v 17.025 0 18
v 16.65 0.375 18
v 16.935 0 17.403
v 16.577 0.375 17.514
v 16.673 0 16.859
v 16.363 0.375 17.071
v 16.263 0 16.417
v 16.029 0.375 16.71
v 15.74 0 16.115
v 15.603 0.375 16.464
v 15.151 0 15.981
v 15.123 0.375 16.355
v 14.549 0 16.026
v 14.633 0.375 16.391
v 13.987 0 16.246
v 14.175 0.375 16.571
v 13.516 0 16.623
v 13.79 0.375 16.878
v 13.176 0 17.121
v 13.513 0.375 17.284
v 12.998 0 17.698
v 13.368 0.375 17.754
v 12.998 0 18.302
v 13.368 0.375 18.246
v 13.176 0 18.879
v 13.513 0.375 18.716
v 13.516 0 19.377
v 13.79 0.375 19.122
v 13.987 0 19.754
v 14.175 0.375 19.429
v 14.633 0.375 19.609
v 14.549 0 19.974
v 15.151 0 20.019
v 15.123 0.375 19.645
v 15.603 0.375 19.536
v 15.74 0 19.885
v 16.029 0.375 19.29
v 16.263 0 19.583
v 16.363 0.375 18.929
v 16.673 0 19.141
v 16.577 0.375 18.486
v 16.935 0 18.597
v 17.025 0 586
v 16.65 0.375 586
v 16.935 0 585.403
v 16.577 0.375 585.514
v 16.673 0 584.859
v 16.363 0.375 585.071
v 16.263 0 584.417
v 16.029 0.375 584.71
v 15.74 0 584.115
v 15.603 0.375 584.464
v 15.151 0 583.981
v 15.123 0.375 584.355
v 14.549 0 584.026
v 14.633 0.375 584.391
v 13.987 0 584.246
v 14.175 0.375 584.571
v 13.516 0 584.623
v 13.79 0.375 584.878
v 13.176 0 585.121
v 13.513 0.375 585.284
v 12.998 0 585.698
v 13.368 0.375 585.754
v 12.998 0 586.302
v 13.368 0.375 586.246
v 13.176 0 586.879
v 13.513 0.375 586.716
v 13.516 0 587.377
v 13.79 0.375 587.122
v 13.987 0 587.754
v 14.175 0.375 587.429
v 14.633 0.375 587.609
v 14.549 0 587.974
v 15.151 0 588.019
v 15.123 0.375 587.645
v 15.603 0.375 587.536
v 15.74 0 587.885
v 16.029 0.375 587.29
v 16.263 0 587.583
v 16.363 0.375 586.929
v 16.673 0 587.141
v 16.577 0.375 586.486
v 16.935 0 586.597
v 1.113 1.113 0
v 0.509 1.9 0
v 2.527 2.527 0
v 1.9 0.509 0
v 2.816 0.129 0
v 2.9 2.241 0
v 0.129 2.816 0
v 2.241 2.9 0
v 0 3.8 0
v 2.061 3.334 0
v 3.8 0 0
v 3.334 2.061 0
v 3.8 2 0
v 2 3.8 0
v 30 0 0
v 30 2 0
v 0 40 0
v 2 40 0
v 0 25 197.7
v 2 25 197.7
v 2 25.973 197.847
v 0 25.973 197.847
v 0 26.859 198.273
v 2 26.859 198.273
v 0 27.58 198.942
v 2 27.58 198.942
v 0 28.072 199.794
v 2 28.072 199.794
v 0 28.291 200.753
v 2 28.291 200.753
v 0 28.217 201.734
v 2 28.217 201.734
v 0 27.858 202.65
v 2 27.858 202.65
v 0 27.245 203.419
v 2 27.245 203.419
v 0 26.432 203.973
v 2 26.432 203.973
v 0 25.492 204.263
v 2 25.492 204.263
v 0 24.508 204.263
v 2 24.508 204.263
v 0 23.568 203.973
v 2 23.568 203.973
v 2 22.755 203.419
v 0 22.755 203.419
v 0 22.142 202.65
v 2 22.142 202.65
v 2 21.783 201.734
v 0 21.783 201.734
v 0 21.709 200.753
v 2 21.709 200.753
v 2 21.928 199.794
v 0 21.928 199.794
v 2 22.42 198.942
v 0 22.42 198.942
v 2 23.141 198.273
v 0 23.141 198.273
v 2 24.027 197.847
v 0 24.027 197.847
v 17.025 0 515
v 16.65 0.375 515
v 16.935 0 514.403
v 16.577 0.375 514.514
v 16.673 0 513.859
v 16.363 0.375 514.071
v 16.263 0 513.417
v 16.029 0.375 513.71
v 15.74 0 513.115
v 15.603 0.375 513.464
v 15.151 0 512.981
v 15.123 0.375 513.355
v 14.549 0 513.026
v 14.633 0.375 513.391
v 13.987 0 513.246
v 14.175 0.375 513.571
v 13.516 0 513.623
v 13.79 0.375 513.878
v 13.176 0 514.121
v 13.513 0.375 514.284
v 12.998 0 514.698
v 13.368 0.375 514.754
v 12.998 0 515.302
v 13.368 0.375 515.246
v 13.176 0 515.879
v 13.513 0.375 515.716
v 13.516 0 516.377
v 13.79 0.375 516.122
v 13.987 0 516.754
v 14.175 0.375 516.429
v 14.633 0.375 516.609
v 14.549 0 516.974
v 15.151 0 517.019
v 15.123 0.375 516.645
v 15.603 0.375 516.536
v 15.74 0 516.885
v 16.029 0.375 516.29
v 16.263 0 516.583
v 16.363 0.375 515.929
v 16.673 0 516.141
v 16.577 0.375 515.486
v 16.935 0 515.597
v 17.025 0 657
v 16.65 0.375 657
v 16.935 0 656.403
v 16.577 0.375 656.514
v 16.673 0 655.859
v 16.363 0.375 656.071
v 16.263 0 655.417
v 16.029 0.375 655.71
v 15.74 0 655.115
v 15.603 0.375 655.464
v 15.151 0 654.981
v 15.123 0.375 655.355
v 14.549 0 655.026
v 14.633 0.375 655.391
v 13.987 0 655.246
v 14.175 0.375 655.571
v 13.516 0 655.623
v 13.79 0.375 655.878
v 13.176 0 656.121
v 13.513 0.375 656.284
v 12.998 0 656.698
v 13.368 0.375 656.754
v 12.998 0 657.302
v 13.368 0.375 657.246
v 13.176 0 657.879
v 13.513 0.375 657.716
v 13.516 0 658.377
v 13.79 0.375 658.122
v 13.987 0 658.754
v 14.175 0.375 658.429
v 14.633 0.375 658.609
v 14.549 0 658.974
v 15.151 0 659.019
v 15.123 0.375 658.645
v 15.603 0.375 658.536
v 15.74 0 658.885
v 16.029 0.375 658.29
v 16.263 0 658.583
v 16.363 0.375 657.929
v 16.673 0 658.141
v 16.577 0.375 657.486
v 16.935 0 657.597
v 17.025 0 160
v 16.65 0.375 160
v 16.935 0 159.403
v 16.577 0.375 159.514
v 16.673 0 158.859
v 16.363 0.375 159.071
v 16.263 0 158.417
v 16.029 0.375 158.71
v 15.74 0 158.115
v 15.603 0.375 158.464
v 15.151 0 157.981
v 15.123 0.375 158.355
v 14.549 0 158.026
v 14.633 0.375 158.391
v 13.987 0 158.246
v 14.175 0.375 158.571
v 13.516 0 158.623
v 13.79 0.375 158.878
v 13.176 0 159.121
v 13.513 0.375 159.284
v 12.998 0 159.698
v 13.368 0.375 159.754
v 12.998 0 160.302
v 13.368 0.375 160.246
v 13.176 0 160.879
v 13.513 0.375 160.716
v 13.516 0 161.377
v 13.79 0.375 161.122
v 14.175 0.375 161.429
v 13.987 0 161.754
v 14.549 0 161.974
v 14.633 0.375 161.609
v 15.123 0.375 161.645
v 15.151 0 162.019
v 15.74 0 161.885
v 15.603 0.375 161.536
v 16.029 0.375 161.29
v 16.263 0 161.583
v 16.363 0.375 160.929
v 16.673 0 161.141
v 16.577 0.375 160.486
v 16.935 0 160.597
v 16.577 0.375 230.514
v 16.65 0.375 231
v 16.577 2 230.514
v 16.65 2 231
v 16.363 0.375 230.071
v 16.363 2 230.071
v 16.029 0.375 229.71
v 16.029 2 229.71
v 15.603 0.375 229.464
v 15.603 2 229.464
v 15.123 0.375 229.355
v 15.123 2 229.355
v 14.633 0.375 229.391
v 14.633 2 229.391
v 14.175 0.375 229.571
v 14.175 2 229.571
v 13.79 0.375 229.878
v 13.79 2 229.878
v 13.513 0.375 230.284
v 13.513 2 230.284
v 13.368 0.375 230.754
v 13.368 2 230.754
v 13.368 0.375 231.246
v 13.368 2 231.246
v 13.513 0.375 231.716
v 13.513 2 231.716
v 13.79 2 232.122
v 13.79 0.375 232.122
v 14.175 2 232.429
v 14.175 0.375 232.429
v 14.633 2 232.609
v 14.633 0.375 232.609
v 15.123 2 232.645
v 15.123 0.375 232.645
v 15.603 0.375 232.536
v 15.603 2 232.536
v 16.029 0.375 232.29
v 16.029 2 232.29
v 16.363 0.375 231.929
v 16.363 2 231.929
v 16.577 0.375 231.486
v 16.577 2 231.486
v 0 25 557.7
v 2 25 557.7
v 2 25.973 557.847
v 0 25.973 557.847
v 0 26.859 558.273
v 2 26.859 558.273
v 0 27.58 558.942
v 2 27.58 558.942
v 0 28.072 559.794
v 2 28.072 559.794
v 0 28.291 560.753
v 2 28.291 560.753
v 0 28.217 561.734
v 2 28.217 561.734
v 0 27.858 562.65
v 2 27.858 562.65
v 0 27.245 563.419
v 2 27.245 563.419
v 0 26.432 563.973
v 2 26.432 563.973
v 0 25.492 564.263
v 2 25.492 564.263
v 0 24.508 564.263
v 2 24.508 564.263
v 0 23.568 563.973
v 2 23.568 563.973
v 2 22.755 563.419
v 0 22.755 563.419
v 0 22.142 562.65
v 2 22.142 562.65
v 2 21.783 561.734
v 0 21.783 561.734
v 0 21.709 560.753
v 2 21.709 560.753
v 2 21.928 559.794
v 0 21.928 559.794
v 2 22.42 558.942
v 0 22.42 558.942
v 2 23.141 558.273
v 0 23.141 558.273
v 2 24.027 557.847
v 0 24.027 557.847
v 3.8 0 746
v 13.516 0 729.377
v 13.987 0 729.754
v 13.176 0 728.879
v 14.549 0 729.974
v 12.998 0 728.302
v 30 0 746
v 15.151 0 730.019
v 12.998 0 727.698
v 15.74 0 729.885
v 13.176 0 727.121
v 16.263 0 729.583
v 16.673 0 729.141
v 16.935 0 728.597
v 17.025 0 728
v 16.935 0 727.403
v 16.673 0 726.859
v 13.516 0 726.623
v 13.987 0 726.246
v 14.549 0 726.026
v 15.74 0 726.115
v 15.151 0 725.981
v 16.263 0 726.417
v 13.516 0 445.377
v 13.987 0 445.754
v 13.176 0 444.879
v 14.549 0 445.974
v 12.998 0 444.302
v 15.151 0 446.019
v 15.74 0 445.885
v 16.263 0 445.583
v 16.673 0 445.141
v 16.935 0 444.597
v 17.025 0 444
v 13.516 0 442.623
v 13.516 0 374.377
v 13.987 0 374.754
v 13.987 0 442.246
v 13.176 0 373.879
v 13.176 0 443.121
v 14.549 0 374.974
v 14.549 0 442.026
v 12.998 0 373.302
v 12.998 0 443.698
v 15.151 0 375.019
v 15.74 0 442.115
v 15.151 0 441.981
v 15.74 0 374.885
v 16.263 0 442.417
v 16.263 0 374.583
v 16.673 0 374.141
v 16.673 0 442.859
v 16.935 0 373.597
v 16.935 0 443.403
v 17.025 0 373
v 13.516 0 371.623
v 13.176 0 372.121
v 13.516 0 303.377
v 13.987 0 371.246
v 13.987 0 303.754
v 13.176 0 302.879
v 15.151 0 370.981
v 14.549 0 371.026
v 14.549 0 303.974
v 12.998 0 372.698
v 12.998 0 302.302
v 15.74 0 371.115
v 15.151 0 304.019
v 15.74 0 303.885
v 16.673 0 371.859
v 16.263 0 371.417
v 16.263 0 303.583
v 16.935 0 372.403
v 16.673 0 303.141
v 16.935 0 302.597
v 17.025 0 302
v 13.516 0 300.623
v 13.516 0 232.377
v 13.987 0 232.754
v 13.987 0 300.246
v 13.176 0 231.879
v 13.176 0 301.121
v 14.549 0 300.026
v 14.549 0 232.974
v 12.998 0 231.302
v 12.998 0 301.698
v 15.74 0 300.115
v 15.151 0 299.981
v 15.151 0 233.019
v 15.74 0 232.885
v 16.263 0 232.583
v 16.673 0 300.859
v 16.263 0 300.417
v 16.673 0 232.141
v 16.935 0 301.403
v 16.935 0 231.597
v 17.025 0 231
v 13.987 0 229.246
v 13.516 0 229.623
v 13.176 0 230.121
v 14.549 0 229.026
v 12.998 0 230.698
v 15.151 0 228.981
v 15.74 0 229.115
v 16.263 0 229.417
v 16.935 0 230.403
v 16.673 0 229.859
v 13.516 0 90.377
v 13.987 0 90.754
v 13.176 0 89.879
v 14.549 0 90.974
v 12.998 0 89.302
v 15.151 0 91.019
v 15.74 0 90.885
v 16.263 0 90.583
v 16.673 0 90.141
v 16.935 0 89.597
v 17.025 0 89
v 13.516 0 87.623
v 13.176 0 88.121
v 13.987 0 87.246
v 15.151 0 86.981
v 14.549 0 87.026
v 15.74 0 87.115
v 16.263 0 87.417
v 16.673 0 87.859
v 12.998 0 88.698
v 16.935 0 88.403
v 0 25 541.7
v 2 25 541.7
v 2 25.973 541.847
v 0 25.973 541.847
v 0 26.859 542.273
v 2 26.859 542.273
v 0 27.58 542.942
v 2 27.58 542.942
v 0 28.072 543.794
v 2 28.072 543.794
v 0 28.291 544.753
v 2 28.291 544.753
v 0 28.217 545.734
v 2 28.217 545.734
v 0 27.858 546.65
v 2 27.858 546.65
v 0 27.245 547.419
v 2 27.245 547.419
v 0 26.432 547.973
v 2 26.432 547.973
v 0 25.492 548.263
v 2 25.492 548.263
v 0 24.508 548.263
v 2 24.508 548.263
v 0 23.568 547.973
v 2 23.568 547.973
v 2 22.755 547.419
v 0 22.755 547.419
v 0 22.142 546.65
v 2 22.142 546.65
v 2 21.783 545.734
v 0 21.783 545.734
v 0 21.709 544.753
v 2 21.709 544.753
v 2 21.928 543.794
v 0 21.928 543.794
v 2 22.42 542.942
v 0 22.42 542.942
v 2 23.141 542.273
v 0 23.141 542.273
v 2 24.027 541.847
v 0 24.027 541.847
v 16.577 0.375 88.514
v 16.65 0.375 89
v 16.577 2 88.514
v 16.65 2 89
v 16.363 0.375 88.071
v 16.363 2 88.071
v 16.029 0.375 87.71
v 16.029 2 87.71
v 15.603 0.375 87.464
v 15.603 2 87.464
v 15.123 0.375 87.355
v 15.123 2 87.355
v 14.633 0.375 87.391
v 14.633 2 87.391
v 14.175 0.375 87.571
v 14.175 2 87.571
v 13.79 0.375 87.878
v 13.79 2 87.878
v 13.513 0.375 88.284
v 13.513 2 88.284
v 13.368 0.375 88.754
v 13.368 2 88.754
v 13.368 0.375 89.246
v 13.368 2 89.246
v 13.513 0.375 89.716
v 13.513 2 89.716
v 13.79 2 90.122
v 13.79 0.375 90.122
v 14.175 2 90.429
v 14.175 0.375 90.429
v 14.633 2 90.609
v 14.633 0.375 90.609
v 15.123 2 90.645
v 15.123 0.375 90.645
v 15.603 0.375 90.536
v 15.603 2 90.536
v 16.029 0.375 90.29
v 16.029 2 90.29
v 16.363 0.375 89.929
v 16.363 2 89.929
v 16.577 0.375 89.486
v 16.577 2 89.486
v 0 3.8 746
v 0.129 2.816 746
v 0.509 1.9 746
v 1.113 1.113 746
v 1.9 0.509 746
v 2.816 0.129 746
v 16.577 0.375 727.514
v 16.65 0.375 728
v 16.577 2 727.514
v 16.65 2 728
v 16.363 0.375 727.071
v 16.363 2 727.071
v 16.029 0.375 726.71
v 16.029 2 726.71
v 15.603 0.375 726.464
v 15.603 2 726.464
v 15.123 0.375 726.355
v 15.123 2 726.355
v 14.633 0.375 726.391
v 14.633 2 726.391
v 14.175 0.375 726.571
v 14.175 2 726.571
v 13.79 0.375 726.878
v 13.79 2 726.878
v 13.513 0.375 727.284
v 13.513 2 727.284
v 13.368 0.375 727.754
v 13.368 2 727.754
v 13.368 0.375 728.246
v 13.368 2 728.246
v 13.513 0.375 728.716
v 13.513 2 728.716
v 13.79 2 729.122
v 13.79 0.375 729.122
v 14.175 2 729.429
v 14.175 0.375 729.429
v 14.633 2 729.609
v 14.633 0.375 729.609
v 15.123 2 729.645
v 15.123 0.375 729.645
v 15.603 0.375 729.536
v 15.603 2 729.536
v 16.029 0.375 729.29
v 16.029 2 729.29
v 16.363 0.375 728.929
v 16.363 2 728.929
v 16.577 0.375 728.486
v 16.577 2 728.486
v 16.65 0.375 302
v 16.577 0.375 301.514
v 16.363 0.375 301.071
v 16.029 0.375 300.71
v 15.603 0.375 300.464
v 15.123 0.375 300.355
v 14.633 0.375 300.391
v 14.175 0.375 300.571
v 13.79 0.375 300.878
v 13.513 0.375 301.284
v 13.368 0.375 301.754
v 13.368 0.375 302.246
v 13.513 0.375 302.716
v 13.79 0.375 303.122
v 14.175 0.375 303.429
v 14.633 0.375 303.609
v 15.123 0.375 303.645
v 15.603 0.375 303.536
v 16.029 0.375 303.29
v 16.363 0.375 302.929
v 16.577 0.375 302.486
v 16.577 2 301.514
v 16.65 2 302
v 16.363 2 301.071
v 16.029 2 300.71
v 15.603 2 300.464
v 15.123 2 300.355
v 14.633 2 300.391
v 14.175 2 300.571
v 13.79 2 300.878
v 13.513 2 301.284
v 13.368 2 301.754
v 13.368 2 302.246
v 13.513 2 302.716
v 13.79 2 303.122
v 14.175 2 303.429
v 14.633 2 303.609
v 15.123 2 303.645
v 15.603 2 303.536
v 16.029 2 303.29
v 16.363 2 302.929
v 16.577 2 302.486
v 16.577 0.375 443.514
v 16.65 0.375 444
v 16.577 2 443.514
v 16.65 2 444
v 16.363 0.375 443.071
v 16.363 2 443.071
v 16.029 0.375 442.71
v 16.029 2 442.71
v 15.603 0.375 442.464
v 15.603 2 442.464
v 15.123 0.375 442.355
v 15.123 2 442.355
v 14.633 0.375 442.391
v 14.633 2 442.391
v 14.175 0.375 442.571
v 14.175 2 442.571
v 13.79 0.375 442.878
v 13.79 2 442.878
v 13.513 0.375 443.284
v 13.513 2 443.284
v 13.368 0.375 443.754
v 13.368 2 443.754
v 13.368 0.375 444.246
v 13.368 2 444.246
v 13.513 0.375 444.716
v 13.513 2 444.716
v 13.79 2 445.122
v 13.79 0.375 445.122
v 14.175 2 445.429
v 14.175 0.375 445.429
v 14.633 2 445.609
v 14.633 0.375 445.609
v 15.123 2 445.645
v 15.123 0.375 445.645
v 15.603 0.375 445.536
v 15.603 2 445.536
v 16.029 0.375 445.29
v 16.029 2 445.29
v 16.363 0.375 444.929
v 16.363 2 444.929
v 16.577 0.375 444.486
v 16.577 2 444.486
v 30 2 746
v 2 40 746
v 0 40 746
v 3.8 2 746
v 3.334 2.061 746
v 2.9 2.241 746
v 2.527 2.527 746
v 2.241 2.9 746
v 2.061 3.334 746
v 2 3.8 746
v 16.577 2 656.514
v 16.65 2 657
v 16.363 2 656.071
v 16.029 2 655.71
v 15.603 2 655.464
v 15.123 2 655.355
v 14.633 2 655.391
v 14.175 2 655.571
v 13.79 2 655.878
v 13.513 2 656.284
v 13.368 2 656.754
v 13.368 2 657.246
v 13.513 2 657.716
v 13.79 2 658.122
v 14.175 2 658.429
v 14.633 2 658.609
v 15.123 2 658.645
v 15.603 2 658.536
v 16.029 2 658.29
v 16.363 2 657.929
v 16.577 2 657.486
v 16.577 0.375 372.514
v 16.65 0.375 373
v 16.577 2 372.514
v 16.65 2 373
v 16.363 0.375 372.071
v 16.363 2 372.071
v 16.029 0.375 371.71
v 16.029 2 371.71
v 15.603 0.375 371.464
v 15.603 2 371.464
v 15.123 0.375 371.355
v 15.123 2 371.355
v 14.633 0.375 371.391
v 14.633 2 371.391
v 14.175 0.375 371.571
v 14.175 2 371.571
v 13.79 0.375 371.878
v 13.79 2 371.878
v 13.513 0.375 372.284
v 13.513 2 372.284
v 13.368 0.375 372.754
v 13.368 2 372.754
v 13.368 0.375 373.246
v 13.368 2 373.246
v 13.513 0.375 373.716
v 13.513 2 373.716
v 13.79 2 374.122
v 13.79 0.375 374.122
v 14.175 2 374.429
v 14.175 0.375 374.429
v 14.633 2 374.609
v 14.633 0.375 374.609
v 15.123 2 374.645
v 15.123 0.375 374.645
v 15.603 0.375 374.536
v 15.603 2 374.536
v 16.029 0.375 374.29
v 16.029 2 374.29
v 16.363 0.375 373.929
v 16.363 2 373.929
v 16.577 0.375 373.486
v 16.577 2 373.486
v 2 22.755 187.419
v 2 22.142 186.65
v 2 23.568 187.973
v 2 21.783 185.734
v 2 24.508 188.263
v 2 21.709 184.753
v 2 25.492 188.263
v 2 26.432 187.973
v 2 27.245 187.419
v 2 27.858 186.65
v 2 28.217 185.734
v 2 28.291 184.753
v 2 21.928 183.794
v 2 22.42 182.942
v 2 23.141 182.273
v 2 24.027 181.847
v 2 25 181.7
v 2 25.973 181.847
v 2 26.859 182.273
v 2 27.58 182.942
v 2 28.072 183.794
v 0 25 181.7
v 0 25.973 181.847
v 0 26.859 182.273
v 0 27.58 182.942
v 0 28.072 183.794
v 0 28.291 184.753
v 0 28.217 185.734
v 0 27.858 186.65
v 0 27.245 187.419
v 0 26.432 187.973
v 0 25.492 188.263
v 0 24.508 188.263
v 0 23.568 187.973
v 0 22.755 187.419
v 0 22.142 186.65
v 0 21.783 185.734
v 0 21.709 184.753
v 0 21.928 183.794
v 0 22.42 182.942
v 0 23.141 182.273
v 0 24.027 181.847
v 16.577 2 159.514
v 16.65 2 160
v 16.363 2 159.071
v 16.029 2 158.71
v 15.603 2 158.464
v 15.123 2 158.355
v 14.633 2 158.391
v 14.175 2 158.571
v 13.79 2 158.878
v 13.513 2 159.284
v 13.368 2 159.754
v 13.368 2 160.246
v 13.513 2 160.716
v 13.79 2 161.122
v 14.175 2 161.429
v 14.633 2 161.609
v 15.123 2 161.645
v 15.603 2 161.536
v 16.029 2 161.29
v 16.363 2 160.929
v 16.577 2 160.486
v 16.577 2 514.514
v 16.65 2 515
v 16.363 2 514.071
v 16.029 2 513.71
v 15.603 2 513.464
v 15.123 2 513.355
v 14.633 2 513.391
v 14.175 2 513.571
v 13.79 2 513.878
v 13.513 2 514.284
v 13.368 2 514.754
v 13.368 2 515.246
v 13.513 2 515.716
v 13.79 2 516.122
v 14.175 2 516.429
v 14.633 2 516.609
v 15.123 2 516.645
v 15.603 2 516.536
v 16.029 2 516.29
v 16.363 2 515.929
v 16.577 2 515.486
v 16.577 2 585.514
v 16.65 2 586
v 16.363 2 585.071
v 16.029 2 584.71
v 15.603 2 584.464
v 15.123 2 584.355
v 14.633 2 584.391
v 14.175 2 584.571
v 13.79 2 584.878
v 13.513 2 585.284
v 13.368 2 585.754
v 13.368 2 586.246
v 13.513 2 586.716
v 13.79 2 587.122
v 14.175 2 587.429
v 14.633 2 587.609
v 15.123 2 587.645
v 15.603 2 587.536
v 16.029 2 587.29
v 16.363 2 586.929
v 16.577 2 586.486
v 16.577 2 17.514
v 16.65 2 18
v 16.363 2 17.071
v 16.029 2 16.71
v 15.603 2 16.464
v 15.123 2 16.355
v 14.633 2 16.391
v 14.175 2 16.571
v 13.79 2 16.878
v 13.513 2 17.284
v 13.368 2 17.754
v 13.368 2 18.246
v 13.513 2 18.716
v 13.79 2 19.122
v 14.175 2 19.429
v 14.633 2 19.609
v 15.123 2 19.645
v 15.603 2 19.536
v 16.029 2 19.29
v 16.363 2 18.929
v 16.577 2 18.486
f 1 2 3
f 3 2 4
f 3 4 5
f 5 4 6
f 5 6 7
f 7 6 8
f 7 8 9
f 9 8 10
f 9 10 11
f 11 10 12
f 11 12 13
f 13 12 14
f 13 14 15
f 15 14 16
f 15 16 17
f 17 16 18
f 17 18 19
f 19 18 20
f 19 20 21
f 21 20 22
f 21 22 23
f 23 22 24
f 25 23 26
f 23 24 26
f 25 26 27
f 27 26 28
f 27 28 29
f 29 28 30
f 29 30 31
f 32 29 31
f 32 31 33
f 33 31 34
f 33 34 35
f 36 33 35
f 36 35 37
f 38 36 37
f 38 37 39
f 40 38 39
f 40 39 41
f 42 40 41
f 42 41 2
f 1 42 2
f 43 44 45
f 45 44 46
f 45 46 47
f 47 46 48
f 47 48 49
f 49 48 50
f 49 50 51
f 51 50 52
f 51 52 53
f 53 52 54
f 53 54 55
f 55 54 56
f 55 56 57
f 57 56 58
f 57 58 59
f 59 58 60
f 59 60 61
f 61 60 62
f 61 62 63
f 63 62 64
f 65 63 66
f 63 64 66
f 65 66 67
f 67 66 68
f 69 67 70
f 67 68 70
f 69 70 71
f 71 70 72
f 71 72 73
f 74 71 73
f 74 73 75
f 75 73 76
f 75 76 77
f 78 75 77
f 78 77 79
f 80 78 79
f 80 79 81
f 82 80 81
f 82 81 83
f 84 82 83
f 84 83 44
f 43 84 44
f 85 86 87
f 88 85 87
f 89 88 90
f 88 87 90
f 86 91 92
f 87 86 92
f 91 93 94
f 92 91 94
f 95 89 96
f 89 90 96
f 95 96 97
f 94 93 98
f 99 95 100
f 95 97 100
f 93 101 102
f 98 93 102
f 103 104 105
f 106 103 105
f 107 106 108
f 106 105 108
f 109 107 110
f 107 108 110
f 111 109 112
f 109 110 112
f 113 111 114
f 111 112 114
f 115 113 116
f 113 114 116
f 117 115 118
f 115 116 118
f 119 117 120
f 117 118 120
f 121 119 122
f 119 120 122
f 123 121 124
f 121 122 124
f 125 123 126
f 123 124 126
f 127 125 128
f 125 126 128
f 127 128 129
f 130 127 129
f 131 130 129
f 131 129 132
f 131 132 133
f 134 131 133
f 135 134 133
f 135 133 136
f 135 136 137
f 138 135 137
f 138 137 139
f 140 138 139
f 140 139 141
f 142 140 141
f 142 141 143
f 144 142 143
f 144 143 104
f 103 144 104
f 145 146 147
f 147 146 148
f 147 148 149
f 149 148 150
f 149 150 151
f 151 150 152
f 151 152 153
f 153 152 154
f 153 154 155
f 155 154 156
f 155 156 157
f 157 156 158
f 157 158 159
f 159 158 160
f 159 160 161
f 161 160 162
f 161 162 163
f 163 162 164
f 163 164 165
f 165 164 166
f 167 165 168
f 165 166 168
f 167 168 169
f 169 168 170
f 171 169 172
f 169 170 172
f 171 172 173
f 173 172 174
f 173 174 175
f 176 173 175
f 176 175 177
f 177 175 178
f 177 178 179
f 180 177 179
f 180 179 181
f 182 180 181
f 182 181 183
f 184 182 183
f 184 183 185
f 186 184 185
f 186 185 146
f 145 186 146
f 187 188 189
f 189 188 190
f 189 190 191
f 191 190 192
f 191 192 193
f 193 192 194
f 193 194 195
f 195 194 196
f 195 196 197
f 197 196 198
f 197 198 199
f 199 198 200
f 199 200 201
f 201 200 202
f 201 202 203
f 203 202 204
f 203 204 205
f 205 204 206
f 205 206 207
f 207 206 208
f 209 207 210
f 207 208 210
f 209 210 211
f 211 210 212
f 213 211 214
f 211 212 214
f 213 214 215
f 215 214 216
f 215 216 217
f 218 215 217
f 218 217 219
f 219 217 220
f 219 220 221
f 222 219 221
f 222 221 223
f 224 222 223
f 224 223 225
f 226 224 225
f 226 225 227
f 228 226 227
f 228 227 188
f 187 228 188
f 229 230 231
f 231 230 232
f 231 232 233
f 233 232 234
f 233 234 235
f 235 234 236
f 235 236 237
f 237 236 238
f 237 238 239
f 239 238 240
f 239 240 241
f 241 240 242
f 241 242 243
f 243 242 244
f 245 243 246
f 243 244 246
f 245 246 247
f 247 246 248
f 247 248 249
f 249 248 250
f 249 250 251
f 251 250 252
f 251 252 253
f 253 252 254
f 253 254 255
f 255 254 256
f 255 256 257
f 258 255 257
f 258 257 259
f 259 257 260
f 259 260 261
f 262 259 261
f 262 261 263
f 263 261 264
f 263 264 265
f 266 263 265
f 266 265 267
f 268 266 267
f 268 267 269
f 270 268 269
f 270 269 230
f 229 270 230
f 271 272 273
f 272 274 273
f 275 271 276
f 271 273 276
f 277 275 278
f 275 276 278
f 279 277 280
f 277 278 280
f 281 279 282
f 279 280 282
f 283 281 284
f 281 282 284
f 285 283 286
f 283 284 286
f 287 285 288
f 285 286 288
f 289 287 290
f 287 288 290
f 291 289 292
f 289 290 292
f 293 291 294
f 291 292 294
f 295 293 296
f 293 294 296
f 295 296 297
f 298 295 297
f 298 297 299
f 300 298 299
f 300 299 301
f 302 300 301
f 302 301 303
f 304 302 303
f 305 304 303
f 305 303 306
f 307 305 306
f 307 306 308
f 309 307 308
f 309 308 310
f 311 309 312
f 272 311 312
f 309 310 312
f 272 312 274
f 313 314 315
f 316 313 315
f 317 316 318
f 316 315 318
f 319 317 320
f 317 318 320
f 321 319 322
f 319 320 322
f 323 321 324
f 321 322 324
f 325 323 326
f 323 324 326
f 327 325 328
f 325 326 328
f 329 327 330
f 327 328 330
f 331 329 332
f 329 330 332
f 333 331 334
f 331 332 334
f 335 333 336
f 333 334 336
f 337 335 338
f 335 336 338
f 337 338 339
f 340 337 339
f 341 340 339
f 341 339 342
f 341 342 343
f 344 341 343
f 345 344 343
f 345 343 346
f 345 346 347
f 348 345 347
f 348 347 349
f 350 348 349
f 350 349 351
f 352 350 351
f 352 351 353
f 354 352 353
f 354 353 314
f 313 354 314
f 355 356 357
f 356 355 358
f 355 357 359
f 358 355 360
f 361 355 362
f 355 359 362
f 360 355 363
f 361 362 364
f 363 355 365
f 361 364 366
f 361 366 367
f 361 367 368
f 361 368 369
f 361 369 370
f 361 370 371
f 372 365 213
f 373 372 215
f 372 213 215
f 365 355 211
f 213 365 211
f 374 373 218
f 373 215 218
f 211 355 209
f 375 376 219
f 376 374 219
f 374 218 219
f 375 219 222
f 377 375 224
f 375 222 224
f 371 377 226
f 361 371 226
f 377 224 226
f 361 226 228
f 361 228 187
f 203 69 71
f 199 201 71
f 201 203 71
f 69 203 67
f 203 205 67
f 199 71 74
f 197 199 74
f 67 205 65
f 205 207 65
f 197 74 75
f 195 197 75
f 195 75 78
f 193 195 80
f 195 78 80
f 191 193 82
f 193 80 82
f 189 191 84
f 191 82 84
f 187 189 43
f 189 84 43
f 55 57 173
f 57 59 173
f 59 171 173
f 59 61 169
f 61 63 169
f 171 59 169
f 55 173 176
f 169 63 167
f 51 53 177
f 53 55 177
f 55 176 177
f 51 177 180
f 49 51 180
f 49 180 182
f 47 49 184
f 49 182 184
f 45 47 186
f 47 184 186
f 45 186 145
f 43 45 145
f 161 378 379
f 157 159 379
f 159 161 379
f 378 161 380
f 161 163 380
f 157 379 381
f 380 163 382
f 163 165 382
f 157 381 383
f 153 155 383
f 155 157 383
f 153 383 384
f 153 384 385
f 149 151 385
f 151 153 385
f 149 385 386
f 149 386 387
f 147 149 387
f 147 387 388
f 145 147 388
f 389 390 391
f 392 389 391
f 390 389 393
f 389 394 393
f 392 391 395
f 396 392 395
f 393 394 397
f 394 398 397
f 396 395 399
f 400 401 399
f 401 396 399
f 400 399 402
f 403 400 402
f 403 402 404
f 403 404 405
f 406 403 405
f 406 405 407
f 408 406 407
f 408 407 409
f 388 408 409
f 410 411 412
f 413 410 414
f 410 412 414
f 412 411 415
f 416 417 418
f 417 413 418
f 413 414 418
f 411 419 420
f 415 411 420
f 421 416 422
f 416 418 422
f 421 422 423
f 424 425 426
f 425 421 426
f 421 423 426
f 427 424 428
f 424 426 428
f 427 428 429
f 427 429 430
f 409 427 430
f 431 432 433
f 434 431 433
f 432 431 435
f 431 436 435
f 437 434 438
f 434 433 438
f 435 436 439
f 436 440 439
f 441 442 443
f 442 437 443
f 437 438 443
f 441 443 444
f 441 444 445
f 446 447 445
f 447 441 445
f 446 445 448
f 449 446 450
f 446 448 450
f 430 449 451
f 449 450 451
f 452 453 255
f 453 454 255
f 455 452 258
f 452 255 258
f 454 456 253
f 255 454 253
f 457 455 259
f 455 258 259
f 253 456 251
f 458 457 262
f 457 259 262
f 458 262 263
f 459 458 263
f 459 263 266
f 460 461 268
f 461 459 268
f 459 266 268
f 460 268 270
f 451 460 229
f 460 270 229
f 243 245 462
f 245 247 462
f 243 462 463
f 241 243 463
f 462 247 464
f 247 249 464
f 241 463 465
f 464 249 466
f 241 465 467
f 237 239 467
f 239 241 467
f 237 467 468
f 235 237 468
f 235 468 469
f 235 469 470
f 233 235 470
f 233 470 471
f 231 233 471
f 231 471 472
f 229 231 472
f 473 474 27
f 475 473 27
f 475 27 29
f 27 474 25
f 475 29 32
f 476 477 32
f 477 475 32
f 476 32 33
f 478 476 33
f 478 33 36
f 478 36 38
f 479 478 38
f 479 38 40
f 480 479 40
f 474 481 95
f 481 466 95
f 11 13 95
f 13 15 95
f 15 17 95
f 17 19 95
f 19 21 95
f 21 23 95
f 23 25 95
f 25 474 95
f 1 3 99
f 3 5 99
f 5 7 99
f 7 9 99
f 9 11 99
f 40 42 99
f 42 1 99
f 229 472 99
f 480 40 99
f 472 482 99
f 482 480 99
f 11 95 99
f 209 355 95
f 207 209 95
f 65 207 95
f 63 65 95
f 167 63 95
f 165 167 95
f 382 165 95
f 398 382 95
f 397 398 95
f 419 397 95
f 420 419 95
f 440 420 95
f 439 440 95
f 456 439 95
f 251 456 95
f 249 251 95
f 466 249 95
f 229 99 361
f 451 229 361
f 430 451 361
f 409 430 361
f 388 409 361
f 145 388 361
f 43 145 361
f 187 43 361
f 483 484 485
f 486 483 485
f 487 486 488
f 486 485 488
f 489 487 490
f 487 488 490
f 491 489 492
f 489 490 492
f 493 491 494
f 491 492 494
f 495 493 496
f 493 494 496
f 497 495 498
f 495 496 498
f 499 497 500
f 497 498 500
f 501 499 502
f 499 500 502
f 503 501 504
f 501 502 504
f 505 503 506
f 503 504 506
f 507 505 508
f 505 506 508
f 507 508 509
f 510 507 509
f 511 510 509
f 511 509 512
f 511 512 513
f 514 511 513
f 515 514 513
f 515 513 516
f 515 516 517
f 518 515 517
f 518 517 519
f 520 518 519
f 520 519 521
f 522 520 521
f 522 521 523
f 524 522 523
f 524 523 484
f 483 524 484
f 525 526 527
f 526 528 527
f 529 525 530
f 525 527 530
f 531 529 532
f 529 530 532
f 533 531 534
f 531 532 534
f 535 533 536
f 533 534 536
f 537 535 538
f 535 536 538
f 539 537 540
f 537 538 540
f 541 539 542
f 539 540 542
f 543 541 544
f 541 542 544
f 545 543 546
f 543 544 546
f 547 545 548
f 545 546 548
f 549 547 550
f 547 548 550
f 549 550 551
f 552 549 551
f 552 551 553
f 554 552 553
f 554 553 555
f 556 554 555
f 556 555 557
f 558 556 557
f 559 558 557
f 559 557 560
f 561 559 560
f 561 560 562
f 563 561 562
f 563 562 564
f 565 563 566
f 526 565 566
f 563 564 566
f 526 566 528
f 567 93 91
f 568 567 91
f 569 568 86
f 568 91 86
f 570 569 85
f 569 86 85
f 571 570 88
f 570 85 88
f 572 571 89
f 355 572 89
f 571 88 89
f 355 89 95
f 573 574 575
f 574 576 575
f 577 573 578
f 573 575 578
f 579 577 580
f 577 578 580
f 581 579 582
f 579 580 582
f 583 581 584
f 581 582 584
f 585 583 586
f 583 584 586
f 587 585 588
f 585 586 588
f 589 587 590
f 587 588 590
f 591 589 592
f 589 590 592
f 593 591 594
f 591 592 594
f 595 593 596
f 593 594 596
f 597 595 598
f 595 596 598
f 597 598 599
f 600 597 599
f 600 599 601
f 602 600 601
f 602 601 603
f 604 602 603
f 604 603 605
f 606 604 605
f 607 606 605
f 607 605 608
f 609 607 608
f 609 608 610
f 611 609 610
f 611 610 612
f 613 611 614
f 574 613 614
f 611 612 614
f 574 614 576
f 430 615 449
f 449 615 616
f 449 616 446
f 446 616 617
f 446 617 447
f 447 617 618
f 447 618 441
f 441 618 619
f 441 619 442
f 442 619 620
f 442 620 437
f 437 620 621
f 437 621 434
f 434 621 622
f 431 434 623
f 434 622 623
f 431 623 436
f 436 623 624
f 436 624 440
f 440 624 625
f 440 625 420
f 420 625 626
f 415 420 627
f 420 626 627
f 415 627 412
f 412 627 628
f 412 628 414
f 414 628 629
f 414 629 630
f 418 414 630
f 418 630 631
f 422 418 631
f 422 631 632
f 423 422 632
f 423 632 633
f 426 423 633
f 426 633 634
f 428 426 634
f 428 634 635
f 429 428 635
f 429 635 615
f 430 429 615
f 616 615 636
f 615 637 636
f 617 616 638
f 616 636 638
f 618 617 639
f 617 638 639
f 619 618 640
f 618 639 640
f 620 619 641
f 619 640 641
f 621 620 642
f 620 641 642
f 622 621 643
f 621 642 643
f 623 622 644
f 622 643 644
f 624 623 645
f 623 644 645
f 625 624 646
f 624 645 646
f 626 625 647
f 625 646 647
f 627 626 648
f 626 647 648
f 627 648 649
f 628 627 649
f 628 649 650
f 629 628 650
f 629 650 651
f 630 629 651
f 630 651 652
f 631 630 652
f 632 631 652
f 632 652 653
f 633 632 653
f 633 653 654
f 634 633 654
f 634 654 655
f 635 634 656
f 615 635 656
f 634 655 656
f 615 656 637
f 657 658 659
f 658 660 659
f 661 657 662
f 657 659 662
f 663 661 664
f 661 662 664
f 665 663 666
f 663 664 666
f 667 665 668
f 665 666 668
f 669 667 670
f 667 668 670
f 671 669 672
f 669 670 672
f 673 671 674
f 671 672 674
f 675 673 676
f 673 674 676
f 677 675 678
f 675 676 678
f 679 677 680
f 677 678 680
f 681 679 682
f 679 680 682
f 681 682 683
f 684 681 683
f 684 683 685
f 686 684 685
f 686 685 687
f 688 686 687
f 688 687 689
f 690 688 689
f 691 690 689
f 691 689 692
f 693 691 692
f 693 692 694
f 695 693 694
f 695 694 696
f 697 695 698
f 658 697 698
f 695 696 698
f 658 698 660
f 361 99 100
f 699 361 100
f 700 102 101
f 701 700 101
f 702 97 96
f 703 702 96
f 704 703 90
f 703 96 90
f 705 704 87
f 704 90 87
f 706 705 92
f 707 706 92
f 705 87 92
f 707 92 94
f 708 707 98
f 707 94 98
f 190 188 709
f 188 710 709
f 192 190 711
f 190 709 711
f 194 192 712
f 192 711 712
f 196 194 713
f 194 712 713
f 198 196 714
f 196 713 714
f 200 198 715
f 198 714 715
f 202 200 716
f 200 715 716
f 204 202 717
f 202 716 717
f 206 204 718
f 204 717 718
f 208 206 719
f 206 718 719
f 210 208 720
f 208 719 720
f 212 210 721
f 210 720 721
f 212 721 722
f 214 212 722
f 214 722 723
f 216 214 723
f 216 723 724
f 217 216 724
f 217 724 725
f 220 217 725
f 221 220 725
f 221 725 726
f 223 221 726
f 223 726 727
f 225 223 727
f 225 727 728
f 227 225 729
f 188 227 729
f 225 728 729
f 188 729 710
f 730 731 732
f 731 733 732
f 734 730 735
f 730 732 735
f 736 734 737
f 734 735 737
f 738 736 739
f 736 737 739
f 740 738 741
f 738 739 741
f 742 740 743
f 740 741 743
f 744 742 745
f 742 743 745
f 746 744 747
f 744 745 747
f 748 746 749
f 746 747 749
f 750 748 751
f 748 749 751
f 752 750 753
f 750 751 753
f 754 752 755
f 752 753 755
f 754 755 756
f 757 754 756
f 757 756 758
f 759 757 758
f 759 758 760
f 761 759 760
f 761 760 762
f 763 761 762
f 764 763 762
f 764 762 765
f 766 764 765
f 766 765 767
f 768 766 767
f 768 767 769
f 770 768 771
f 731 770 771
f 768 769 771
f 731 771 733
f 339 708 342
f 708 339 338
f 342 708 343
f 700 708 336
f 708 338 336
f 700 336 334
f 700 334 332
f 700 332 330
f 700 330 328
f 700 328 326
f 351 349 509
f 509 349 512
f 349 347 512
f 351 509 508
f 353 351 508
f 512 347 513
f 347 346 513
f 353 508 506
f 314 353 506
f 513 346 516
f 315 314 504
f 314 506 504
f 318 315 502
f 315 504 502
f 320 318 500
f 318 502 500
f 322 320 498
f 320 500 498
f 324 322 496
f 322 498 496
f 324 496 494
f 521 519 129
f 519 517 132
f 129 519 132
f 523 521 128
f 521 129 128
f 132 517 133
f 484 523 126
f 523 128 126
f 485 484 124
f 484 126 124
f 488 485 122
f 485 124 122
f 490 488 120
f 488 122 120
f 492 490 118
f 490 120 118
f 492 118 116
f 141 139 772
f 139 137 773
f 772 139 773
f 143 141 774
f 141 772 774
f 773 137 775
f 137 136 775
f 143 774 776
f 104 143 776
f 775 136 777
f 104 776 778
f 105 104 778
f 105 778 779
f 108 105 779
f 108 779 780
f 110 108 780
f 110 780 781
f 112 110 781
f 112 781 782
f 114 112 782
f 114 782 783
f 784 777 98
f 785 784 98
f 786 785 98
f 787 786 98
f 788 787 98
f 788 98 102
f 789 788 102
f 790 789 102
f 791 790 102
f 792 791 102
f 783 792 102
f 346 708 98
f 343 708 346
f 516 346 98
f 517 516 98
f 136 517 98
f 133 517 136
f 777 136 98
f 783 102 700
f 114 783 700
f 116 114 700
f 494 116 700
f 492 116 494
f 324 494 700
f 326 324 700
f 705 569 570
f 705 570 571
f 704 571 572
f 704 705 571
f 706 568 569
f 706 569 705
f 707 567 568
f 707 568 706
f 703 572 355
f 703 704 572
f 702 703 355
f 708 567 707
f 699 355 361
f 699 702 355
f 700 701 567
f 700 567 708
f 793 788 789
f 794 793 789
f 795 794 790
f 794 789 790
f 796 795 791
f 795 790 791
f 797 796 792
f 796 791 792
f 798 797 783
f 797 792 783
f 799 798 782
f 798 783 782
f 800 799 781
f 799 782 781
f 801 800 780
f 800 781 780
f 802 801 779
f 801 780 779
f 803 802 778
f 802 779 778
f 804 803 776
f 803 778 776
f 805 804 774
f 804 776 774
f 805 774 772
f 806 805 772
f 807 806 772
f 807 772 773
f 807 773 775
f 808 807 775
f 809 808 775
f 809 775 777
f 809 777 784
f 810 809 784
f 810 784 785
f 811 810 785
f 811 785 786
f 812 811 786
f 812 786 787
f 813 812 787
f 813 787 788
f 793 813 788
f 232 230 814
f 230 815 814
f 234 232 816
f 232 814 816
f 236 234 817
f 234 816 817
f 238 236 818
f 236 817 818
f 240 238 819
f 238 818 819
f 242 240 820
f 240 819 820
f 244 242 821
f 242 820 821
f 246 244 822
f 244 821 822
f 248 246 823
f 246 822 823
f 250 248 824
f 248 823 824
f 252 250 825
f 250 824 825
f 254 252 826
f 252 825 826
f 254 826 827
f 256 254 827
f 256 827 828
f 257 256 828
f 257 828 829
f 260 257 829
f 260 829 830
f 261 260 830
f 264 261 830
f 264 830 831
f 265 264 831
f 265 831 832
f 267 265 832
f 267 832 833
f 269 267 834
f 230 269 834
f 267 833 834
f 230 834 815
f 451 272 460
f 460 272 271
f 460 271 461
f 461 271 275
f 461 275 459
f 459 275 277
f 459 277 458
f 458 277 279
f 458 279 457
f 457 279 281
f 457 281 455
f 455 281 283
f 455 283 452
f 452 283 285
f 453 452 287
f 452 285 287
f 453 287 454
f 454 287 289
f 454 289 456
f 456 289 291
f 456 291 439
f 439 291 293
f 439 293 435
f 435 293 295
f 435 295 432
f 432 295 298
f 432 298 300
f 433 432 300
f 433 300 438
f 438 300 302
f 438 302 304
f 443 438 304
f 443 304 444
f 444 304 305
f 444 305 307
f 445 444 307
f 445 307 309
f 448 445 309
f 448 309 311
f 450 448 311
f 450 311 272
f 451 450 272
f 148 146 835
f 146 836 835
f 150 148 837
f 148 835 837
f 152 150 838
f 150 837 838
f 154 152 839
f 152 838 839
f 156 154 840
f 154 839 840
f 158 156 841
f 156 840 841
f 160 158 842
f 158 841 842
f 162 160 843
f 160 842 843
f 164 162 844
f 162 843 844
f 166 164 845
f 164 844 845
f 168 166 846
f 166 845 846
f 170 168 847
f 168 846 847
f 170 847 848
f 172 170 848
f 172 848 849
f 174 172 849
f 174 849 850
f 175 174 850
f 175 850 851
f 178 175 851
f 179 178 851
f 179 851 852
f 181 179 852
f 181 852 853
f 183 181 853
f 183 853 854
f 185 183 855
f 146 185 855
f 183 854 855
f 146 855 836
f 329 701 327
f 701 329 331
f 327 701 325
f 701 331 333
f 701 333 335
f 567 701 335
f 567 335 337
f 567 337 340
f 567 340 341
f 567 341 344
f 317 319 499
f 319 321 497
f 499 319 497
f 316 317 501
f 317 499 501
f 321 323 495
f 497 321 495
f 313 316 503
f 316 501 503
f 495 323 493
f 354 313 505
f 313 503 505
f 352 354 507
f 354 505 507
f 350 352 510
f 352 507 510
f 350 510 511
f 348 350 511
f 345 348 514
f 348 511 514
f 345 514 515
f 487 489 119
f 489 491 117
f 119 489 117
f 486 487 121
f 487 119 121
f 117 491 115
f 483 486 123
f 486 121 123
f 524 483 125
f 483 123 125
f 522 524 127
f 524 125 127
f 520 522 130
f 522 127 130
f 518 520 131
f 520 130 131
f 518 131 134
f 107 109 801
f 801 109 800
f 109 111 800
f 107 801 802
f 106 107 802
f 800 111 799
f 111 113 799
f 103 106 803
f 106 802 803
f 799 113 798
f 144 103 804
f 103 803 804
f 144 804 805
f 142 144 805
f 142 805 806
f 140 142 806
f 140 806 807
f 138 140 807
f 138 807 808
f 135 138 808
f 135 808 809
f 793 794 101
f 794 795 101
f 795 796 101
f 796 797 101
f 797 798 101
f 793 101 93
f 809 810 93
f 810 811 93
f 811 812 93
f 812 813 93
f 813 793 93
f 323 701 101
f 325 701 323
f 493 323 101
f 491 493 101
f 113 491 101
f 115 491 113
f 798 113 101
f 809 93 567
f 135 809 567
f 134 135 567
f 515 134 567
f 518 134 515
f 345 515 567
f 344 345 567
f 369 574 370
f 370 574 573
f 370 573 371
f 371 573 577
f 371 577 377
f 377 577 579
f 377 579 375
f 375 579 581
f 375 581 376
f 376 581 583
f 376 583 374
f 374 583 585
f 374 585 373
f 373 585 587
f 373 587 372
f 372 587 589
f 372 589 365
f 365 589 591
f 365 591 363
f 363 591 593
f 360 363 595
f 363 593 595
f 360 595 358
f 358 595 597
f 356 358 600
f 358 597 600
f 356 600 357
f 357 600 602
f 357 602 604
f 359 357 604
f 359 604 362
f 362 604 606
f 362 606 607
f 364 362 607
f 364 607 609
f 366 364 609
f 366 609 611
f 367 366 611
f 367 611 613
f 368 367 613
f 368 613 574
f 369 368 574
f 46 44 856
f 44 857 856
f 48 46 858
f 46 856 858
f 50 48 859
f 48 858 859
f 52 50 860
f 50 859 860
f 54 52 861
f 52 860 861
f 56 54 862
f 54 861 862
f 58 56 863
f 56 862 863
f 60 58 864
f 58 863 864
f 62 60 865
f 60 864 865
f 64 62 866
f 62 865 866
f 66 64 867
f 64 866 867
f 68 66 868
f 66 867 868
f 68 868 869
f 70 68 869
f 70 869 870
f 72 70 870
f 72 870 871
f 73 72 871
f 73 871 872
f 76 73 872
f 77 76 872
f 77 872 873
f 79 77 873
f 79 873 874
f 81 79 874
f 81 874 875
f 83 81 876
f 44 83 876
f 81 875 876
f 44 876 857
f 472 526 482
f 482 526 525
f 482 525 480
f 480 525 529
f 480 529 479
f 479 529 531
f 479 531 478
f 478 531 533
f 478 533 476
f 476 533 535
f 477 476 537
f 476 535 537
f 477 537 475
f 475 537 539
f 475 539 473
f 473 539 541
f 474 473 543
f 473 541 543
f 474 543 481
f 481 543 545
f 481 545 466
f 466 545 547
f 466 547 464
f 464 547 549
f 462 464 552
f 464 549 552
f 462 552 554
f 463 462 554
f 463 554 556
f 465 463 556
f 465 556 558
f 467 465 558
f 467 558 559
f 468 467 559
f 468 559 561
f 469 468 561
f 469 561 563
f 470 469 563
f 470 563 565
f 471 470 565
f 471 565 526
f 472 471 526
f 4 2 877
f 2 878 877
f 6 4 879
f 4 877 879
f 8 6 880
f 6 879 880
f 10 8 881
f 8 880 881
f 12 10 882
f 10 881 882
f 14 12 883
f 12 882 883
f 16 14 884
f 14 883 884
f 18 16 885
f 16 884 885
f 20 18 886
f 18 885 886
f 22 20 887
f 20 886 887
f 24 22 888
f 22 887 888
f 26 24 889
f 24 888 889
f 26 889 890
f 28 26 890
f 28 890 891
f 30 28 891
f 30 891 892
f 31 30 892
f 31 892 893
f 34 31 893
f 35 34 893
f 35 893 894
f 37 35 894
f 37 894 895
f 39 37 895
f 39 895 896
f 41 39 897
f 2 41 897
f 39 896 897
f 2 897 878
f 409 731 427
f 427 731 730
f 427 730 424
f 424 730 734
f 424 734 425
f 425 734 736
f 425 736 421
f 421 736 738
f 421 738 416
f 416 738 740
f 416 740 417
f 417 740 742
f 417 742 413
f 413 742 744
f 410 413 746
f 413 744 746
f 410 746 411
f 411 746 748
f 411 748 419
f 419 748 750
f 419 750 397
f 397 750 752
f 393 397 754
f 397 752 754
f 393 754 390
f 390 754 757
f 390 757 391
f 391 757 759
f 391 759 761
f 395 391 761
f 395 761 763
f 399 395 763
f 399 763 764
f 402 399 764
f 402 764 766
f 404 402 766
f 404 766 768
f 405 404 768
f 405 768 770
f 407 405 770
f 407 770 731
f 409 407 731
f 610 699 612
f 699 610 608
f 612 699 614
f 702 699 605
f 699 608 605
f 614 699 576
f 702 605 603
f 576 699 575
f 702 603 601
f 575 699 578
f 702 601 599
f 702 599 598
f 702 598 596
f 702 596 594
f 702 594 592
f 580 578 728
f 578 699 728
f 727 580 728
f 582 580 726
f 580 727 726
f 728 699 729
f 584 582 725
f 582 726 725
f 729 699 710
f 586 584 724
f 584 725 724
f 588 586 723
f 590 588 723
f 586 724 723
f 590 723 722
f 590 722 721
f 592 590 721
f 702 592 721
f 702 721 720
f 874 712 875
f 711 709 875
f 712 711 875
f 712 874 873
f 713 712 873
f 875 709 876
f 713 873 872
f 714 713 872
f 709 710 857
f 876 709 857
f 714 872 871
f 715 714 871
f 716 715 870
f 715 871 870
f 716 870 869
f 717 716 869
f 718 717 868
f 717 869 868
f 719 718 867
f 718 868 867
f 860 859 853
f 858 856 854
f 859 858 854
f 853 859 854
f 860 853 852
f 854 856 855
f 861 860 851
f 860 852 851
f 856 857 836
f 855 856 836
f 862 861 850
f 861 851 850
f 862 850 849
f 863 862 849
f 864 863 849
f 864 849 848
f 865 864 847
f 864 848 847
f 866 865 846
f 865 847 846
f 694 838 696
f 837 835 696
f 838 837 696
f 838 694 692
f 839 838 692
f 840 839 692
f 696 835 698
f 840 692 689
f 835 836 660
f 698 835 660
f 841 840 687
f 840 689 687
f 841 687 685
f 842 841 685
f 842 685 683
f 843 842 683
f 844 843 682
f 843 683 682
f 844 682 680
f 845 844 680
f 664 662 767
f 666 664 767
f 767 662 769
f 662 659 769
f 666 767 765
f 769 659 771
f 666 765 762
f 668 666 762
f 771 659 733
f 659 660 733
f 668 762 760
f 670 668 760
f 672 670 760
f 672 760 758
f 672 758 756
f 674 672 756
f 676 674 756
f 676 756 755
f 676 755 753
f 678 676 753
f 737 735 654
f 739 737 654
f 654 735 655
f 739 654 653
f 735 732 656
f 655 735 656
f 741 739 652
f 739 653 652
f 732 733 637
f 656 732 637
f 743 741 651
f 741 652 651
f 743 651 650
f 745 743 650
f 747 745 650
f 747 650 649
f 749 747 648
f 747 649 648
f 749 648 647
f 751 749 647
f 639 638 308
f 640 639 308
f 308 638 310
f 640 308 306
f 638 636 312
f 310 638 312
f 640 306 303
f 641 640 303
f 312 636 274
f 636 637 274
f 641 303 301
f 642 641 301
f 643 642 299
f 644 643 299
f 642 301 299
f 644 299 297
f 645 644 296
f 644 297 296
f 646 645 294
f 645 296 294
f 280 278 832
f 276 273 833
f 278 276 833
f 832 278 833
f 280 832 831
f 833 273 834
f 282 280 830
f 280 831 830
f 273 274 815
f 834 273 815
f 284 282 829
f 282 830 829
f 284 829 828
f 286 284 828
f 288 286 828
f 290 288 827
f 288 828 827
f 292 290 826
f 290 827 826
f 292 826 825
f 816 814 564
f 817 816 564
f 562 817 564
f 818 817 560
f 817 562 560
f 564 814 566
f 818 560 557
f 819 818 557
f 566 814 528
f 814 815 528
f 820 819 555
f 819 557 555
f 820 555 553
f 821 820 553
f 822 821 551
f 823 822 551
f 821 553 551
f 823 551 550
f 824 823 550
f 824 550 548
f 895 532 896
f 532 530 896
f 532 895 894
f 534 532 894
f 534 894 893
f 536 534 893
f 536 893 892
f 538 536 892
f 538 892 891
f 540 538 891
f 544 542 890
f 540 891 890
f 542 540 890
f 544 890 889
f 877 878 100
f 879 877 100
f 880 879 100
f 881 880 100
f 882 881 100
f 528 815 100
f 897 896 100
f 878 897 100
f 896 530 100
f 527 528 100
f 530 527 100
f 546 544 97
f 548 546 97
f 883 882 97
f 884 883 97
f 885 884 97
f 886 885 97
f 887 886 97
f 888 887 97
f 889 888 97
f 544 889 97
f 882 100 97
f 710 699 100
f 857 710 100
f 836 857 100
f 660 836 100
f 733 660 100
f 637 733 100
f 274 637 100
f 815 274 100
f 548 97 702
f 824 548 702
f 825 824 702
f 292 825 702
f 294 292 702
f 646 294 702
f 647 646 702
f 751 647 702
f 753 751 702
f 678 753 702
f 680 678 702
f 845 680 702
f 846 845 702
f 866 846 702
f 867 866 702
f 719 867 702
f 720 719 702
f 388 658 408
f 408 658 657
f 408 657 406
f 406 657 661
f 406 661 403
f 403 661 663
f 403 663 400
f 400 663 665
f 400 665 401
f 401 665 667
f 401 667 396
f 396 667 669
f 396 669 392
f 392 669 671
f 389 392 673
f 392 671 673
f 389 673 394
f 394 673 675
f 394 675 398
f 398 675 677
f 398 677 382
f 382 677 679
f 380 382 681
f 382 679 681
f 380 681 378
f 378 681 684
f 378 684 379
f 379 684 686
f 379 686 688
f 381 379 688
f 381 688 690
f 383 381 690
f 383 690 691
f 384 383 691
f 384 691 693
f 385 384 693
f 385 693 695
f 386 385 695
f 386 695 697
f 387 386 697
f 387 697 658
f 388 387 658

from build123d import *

# Parameters (mm, degrees)
SM_BASE_FLANGE_1_DEPTH      = 746
HOLE_WIZARD_M41_D           = 3.3
HOLE_WIZARD_M41_DEPTH       = 11.5
HOLE_WIZARD_M41_CSINK_D     = 4.05
HOLE_WIZARD_M41_CSINK_ANGLE = 90
HOLE_WIZARD_M41_TIP         = 0.991420021
HOLE_WIZARD_M61_D           = 6.6
HOLE_WIZARD_M61_DEPTH       = 59
HOLE_WIZARD_M61_TIP         = 1.982840043


# Sheet-metal steps are written as plain solids
with BuildPart() as part:
    # Sketch 1 → Базовая кромка1 (new body)
    with BuildSketch(Plane.XY):
        with BuildLine():
            Line((0, 40), (0, 3.8))
            ThreePointArc((0, 3.8), (1.112994231, 1.112994231), (3.8, 0))
            Line((3.8, 0), (30, 0))
            Line((30, 0), (30, 2))
            Line((30, 2), (3.8, 2))
            ThreePointArc((3.8, 2), (2.527207794, 2.527207794), (2, 3.8))
            Line((2, 3.8), (2, 40))
            Line((2, 40), (0, 40))
        make_face()
    extrude(amount=SM_BASE_FLANGE_1_DEPTH)

    # Отверстие обработанное метчиком M41
    with Locations(Plane(origin=(0, 0, 0), x_dir=(-1, 0, 0), z_dir=(0, -1, 0))):
        with Locations((-15, -18), (-15, -89), (-15, -160), (-15, -231), (-15, -302), (-15, -373), (-15, -444), (-15, -515), (-15, -586), (-15, -657), (-15, -728)):
            CounterSinkHole(HOLE_WIZARD_M41_D / 2, HOLE_WIZARD_M41_CSINK_D / 2, depth=HOLE_WIZARD_M41_DEPTH, counter_sink_angle=HOLE_WIZARD_M41_CSINK_ANGLE)
            with Locations((0, 0, -(HOLE_WIZARD_M41_DEPTH + HOLE_WIZARD_M41_TIP / 2))):  # 118° drill point
                Cone(0, HOLE_WIZARD_M41_D / 2, HOLE_WIZARD_M41_TIP, mode=Mode.SUBTRACT)

    # Отверстие с зазором M61
    with Locations(Plane.ZY):
        with Locations((561, 25), (545, 25), (185, 25), (201, 25)):
            Hole(HOLE_WIZARD_M61_D / 2, depth=HOLE_WIZARD_M61_DEPTH)
            with Locations((0, 0, -(HOLE_WIZARD_M61_DEPTH + HOLE_WIZARD_M61_TIP / 2))):  # 118° drill point
                Cone(0, HOLE_WIZARD_M61_D / 2, HOLE_WIZARD_M61_TIP, mode=Mode.SUBTRACT)


solid = part.part
